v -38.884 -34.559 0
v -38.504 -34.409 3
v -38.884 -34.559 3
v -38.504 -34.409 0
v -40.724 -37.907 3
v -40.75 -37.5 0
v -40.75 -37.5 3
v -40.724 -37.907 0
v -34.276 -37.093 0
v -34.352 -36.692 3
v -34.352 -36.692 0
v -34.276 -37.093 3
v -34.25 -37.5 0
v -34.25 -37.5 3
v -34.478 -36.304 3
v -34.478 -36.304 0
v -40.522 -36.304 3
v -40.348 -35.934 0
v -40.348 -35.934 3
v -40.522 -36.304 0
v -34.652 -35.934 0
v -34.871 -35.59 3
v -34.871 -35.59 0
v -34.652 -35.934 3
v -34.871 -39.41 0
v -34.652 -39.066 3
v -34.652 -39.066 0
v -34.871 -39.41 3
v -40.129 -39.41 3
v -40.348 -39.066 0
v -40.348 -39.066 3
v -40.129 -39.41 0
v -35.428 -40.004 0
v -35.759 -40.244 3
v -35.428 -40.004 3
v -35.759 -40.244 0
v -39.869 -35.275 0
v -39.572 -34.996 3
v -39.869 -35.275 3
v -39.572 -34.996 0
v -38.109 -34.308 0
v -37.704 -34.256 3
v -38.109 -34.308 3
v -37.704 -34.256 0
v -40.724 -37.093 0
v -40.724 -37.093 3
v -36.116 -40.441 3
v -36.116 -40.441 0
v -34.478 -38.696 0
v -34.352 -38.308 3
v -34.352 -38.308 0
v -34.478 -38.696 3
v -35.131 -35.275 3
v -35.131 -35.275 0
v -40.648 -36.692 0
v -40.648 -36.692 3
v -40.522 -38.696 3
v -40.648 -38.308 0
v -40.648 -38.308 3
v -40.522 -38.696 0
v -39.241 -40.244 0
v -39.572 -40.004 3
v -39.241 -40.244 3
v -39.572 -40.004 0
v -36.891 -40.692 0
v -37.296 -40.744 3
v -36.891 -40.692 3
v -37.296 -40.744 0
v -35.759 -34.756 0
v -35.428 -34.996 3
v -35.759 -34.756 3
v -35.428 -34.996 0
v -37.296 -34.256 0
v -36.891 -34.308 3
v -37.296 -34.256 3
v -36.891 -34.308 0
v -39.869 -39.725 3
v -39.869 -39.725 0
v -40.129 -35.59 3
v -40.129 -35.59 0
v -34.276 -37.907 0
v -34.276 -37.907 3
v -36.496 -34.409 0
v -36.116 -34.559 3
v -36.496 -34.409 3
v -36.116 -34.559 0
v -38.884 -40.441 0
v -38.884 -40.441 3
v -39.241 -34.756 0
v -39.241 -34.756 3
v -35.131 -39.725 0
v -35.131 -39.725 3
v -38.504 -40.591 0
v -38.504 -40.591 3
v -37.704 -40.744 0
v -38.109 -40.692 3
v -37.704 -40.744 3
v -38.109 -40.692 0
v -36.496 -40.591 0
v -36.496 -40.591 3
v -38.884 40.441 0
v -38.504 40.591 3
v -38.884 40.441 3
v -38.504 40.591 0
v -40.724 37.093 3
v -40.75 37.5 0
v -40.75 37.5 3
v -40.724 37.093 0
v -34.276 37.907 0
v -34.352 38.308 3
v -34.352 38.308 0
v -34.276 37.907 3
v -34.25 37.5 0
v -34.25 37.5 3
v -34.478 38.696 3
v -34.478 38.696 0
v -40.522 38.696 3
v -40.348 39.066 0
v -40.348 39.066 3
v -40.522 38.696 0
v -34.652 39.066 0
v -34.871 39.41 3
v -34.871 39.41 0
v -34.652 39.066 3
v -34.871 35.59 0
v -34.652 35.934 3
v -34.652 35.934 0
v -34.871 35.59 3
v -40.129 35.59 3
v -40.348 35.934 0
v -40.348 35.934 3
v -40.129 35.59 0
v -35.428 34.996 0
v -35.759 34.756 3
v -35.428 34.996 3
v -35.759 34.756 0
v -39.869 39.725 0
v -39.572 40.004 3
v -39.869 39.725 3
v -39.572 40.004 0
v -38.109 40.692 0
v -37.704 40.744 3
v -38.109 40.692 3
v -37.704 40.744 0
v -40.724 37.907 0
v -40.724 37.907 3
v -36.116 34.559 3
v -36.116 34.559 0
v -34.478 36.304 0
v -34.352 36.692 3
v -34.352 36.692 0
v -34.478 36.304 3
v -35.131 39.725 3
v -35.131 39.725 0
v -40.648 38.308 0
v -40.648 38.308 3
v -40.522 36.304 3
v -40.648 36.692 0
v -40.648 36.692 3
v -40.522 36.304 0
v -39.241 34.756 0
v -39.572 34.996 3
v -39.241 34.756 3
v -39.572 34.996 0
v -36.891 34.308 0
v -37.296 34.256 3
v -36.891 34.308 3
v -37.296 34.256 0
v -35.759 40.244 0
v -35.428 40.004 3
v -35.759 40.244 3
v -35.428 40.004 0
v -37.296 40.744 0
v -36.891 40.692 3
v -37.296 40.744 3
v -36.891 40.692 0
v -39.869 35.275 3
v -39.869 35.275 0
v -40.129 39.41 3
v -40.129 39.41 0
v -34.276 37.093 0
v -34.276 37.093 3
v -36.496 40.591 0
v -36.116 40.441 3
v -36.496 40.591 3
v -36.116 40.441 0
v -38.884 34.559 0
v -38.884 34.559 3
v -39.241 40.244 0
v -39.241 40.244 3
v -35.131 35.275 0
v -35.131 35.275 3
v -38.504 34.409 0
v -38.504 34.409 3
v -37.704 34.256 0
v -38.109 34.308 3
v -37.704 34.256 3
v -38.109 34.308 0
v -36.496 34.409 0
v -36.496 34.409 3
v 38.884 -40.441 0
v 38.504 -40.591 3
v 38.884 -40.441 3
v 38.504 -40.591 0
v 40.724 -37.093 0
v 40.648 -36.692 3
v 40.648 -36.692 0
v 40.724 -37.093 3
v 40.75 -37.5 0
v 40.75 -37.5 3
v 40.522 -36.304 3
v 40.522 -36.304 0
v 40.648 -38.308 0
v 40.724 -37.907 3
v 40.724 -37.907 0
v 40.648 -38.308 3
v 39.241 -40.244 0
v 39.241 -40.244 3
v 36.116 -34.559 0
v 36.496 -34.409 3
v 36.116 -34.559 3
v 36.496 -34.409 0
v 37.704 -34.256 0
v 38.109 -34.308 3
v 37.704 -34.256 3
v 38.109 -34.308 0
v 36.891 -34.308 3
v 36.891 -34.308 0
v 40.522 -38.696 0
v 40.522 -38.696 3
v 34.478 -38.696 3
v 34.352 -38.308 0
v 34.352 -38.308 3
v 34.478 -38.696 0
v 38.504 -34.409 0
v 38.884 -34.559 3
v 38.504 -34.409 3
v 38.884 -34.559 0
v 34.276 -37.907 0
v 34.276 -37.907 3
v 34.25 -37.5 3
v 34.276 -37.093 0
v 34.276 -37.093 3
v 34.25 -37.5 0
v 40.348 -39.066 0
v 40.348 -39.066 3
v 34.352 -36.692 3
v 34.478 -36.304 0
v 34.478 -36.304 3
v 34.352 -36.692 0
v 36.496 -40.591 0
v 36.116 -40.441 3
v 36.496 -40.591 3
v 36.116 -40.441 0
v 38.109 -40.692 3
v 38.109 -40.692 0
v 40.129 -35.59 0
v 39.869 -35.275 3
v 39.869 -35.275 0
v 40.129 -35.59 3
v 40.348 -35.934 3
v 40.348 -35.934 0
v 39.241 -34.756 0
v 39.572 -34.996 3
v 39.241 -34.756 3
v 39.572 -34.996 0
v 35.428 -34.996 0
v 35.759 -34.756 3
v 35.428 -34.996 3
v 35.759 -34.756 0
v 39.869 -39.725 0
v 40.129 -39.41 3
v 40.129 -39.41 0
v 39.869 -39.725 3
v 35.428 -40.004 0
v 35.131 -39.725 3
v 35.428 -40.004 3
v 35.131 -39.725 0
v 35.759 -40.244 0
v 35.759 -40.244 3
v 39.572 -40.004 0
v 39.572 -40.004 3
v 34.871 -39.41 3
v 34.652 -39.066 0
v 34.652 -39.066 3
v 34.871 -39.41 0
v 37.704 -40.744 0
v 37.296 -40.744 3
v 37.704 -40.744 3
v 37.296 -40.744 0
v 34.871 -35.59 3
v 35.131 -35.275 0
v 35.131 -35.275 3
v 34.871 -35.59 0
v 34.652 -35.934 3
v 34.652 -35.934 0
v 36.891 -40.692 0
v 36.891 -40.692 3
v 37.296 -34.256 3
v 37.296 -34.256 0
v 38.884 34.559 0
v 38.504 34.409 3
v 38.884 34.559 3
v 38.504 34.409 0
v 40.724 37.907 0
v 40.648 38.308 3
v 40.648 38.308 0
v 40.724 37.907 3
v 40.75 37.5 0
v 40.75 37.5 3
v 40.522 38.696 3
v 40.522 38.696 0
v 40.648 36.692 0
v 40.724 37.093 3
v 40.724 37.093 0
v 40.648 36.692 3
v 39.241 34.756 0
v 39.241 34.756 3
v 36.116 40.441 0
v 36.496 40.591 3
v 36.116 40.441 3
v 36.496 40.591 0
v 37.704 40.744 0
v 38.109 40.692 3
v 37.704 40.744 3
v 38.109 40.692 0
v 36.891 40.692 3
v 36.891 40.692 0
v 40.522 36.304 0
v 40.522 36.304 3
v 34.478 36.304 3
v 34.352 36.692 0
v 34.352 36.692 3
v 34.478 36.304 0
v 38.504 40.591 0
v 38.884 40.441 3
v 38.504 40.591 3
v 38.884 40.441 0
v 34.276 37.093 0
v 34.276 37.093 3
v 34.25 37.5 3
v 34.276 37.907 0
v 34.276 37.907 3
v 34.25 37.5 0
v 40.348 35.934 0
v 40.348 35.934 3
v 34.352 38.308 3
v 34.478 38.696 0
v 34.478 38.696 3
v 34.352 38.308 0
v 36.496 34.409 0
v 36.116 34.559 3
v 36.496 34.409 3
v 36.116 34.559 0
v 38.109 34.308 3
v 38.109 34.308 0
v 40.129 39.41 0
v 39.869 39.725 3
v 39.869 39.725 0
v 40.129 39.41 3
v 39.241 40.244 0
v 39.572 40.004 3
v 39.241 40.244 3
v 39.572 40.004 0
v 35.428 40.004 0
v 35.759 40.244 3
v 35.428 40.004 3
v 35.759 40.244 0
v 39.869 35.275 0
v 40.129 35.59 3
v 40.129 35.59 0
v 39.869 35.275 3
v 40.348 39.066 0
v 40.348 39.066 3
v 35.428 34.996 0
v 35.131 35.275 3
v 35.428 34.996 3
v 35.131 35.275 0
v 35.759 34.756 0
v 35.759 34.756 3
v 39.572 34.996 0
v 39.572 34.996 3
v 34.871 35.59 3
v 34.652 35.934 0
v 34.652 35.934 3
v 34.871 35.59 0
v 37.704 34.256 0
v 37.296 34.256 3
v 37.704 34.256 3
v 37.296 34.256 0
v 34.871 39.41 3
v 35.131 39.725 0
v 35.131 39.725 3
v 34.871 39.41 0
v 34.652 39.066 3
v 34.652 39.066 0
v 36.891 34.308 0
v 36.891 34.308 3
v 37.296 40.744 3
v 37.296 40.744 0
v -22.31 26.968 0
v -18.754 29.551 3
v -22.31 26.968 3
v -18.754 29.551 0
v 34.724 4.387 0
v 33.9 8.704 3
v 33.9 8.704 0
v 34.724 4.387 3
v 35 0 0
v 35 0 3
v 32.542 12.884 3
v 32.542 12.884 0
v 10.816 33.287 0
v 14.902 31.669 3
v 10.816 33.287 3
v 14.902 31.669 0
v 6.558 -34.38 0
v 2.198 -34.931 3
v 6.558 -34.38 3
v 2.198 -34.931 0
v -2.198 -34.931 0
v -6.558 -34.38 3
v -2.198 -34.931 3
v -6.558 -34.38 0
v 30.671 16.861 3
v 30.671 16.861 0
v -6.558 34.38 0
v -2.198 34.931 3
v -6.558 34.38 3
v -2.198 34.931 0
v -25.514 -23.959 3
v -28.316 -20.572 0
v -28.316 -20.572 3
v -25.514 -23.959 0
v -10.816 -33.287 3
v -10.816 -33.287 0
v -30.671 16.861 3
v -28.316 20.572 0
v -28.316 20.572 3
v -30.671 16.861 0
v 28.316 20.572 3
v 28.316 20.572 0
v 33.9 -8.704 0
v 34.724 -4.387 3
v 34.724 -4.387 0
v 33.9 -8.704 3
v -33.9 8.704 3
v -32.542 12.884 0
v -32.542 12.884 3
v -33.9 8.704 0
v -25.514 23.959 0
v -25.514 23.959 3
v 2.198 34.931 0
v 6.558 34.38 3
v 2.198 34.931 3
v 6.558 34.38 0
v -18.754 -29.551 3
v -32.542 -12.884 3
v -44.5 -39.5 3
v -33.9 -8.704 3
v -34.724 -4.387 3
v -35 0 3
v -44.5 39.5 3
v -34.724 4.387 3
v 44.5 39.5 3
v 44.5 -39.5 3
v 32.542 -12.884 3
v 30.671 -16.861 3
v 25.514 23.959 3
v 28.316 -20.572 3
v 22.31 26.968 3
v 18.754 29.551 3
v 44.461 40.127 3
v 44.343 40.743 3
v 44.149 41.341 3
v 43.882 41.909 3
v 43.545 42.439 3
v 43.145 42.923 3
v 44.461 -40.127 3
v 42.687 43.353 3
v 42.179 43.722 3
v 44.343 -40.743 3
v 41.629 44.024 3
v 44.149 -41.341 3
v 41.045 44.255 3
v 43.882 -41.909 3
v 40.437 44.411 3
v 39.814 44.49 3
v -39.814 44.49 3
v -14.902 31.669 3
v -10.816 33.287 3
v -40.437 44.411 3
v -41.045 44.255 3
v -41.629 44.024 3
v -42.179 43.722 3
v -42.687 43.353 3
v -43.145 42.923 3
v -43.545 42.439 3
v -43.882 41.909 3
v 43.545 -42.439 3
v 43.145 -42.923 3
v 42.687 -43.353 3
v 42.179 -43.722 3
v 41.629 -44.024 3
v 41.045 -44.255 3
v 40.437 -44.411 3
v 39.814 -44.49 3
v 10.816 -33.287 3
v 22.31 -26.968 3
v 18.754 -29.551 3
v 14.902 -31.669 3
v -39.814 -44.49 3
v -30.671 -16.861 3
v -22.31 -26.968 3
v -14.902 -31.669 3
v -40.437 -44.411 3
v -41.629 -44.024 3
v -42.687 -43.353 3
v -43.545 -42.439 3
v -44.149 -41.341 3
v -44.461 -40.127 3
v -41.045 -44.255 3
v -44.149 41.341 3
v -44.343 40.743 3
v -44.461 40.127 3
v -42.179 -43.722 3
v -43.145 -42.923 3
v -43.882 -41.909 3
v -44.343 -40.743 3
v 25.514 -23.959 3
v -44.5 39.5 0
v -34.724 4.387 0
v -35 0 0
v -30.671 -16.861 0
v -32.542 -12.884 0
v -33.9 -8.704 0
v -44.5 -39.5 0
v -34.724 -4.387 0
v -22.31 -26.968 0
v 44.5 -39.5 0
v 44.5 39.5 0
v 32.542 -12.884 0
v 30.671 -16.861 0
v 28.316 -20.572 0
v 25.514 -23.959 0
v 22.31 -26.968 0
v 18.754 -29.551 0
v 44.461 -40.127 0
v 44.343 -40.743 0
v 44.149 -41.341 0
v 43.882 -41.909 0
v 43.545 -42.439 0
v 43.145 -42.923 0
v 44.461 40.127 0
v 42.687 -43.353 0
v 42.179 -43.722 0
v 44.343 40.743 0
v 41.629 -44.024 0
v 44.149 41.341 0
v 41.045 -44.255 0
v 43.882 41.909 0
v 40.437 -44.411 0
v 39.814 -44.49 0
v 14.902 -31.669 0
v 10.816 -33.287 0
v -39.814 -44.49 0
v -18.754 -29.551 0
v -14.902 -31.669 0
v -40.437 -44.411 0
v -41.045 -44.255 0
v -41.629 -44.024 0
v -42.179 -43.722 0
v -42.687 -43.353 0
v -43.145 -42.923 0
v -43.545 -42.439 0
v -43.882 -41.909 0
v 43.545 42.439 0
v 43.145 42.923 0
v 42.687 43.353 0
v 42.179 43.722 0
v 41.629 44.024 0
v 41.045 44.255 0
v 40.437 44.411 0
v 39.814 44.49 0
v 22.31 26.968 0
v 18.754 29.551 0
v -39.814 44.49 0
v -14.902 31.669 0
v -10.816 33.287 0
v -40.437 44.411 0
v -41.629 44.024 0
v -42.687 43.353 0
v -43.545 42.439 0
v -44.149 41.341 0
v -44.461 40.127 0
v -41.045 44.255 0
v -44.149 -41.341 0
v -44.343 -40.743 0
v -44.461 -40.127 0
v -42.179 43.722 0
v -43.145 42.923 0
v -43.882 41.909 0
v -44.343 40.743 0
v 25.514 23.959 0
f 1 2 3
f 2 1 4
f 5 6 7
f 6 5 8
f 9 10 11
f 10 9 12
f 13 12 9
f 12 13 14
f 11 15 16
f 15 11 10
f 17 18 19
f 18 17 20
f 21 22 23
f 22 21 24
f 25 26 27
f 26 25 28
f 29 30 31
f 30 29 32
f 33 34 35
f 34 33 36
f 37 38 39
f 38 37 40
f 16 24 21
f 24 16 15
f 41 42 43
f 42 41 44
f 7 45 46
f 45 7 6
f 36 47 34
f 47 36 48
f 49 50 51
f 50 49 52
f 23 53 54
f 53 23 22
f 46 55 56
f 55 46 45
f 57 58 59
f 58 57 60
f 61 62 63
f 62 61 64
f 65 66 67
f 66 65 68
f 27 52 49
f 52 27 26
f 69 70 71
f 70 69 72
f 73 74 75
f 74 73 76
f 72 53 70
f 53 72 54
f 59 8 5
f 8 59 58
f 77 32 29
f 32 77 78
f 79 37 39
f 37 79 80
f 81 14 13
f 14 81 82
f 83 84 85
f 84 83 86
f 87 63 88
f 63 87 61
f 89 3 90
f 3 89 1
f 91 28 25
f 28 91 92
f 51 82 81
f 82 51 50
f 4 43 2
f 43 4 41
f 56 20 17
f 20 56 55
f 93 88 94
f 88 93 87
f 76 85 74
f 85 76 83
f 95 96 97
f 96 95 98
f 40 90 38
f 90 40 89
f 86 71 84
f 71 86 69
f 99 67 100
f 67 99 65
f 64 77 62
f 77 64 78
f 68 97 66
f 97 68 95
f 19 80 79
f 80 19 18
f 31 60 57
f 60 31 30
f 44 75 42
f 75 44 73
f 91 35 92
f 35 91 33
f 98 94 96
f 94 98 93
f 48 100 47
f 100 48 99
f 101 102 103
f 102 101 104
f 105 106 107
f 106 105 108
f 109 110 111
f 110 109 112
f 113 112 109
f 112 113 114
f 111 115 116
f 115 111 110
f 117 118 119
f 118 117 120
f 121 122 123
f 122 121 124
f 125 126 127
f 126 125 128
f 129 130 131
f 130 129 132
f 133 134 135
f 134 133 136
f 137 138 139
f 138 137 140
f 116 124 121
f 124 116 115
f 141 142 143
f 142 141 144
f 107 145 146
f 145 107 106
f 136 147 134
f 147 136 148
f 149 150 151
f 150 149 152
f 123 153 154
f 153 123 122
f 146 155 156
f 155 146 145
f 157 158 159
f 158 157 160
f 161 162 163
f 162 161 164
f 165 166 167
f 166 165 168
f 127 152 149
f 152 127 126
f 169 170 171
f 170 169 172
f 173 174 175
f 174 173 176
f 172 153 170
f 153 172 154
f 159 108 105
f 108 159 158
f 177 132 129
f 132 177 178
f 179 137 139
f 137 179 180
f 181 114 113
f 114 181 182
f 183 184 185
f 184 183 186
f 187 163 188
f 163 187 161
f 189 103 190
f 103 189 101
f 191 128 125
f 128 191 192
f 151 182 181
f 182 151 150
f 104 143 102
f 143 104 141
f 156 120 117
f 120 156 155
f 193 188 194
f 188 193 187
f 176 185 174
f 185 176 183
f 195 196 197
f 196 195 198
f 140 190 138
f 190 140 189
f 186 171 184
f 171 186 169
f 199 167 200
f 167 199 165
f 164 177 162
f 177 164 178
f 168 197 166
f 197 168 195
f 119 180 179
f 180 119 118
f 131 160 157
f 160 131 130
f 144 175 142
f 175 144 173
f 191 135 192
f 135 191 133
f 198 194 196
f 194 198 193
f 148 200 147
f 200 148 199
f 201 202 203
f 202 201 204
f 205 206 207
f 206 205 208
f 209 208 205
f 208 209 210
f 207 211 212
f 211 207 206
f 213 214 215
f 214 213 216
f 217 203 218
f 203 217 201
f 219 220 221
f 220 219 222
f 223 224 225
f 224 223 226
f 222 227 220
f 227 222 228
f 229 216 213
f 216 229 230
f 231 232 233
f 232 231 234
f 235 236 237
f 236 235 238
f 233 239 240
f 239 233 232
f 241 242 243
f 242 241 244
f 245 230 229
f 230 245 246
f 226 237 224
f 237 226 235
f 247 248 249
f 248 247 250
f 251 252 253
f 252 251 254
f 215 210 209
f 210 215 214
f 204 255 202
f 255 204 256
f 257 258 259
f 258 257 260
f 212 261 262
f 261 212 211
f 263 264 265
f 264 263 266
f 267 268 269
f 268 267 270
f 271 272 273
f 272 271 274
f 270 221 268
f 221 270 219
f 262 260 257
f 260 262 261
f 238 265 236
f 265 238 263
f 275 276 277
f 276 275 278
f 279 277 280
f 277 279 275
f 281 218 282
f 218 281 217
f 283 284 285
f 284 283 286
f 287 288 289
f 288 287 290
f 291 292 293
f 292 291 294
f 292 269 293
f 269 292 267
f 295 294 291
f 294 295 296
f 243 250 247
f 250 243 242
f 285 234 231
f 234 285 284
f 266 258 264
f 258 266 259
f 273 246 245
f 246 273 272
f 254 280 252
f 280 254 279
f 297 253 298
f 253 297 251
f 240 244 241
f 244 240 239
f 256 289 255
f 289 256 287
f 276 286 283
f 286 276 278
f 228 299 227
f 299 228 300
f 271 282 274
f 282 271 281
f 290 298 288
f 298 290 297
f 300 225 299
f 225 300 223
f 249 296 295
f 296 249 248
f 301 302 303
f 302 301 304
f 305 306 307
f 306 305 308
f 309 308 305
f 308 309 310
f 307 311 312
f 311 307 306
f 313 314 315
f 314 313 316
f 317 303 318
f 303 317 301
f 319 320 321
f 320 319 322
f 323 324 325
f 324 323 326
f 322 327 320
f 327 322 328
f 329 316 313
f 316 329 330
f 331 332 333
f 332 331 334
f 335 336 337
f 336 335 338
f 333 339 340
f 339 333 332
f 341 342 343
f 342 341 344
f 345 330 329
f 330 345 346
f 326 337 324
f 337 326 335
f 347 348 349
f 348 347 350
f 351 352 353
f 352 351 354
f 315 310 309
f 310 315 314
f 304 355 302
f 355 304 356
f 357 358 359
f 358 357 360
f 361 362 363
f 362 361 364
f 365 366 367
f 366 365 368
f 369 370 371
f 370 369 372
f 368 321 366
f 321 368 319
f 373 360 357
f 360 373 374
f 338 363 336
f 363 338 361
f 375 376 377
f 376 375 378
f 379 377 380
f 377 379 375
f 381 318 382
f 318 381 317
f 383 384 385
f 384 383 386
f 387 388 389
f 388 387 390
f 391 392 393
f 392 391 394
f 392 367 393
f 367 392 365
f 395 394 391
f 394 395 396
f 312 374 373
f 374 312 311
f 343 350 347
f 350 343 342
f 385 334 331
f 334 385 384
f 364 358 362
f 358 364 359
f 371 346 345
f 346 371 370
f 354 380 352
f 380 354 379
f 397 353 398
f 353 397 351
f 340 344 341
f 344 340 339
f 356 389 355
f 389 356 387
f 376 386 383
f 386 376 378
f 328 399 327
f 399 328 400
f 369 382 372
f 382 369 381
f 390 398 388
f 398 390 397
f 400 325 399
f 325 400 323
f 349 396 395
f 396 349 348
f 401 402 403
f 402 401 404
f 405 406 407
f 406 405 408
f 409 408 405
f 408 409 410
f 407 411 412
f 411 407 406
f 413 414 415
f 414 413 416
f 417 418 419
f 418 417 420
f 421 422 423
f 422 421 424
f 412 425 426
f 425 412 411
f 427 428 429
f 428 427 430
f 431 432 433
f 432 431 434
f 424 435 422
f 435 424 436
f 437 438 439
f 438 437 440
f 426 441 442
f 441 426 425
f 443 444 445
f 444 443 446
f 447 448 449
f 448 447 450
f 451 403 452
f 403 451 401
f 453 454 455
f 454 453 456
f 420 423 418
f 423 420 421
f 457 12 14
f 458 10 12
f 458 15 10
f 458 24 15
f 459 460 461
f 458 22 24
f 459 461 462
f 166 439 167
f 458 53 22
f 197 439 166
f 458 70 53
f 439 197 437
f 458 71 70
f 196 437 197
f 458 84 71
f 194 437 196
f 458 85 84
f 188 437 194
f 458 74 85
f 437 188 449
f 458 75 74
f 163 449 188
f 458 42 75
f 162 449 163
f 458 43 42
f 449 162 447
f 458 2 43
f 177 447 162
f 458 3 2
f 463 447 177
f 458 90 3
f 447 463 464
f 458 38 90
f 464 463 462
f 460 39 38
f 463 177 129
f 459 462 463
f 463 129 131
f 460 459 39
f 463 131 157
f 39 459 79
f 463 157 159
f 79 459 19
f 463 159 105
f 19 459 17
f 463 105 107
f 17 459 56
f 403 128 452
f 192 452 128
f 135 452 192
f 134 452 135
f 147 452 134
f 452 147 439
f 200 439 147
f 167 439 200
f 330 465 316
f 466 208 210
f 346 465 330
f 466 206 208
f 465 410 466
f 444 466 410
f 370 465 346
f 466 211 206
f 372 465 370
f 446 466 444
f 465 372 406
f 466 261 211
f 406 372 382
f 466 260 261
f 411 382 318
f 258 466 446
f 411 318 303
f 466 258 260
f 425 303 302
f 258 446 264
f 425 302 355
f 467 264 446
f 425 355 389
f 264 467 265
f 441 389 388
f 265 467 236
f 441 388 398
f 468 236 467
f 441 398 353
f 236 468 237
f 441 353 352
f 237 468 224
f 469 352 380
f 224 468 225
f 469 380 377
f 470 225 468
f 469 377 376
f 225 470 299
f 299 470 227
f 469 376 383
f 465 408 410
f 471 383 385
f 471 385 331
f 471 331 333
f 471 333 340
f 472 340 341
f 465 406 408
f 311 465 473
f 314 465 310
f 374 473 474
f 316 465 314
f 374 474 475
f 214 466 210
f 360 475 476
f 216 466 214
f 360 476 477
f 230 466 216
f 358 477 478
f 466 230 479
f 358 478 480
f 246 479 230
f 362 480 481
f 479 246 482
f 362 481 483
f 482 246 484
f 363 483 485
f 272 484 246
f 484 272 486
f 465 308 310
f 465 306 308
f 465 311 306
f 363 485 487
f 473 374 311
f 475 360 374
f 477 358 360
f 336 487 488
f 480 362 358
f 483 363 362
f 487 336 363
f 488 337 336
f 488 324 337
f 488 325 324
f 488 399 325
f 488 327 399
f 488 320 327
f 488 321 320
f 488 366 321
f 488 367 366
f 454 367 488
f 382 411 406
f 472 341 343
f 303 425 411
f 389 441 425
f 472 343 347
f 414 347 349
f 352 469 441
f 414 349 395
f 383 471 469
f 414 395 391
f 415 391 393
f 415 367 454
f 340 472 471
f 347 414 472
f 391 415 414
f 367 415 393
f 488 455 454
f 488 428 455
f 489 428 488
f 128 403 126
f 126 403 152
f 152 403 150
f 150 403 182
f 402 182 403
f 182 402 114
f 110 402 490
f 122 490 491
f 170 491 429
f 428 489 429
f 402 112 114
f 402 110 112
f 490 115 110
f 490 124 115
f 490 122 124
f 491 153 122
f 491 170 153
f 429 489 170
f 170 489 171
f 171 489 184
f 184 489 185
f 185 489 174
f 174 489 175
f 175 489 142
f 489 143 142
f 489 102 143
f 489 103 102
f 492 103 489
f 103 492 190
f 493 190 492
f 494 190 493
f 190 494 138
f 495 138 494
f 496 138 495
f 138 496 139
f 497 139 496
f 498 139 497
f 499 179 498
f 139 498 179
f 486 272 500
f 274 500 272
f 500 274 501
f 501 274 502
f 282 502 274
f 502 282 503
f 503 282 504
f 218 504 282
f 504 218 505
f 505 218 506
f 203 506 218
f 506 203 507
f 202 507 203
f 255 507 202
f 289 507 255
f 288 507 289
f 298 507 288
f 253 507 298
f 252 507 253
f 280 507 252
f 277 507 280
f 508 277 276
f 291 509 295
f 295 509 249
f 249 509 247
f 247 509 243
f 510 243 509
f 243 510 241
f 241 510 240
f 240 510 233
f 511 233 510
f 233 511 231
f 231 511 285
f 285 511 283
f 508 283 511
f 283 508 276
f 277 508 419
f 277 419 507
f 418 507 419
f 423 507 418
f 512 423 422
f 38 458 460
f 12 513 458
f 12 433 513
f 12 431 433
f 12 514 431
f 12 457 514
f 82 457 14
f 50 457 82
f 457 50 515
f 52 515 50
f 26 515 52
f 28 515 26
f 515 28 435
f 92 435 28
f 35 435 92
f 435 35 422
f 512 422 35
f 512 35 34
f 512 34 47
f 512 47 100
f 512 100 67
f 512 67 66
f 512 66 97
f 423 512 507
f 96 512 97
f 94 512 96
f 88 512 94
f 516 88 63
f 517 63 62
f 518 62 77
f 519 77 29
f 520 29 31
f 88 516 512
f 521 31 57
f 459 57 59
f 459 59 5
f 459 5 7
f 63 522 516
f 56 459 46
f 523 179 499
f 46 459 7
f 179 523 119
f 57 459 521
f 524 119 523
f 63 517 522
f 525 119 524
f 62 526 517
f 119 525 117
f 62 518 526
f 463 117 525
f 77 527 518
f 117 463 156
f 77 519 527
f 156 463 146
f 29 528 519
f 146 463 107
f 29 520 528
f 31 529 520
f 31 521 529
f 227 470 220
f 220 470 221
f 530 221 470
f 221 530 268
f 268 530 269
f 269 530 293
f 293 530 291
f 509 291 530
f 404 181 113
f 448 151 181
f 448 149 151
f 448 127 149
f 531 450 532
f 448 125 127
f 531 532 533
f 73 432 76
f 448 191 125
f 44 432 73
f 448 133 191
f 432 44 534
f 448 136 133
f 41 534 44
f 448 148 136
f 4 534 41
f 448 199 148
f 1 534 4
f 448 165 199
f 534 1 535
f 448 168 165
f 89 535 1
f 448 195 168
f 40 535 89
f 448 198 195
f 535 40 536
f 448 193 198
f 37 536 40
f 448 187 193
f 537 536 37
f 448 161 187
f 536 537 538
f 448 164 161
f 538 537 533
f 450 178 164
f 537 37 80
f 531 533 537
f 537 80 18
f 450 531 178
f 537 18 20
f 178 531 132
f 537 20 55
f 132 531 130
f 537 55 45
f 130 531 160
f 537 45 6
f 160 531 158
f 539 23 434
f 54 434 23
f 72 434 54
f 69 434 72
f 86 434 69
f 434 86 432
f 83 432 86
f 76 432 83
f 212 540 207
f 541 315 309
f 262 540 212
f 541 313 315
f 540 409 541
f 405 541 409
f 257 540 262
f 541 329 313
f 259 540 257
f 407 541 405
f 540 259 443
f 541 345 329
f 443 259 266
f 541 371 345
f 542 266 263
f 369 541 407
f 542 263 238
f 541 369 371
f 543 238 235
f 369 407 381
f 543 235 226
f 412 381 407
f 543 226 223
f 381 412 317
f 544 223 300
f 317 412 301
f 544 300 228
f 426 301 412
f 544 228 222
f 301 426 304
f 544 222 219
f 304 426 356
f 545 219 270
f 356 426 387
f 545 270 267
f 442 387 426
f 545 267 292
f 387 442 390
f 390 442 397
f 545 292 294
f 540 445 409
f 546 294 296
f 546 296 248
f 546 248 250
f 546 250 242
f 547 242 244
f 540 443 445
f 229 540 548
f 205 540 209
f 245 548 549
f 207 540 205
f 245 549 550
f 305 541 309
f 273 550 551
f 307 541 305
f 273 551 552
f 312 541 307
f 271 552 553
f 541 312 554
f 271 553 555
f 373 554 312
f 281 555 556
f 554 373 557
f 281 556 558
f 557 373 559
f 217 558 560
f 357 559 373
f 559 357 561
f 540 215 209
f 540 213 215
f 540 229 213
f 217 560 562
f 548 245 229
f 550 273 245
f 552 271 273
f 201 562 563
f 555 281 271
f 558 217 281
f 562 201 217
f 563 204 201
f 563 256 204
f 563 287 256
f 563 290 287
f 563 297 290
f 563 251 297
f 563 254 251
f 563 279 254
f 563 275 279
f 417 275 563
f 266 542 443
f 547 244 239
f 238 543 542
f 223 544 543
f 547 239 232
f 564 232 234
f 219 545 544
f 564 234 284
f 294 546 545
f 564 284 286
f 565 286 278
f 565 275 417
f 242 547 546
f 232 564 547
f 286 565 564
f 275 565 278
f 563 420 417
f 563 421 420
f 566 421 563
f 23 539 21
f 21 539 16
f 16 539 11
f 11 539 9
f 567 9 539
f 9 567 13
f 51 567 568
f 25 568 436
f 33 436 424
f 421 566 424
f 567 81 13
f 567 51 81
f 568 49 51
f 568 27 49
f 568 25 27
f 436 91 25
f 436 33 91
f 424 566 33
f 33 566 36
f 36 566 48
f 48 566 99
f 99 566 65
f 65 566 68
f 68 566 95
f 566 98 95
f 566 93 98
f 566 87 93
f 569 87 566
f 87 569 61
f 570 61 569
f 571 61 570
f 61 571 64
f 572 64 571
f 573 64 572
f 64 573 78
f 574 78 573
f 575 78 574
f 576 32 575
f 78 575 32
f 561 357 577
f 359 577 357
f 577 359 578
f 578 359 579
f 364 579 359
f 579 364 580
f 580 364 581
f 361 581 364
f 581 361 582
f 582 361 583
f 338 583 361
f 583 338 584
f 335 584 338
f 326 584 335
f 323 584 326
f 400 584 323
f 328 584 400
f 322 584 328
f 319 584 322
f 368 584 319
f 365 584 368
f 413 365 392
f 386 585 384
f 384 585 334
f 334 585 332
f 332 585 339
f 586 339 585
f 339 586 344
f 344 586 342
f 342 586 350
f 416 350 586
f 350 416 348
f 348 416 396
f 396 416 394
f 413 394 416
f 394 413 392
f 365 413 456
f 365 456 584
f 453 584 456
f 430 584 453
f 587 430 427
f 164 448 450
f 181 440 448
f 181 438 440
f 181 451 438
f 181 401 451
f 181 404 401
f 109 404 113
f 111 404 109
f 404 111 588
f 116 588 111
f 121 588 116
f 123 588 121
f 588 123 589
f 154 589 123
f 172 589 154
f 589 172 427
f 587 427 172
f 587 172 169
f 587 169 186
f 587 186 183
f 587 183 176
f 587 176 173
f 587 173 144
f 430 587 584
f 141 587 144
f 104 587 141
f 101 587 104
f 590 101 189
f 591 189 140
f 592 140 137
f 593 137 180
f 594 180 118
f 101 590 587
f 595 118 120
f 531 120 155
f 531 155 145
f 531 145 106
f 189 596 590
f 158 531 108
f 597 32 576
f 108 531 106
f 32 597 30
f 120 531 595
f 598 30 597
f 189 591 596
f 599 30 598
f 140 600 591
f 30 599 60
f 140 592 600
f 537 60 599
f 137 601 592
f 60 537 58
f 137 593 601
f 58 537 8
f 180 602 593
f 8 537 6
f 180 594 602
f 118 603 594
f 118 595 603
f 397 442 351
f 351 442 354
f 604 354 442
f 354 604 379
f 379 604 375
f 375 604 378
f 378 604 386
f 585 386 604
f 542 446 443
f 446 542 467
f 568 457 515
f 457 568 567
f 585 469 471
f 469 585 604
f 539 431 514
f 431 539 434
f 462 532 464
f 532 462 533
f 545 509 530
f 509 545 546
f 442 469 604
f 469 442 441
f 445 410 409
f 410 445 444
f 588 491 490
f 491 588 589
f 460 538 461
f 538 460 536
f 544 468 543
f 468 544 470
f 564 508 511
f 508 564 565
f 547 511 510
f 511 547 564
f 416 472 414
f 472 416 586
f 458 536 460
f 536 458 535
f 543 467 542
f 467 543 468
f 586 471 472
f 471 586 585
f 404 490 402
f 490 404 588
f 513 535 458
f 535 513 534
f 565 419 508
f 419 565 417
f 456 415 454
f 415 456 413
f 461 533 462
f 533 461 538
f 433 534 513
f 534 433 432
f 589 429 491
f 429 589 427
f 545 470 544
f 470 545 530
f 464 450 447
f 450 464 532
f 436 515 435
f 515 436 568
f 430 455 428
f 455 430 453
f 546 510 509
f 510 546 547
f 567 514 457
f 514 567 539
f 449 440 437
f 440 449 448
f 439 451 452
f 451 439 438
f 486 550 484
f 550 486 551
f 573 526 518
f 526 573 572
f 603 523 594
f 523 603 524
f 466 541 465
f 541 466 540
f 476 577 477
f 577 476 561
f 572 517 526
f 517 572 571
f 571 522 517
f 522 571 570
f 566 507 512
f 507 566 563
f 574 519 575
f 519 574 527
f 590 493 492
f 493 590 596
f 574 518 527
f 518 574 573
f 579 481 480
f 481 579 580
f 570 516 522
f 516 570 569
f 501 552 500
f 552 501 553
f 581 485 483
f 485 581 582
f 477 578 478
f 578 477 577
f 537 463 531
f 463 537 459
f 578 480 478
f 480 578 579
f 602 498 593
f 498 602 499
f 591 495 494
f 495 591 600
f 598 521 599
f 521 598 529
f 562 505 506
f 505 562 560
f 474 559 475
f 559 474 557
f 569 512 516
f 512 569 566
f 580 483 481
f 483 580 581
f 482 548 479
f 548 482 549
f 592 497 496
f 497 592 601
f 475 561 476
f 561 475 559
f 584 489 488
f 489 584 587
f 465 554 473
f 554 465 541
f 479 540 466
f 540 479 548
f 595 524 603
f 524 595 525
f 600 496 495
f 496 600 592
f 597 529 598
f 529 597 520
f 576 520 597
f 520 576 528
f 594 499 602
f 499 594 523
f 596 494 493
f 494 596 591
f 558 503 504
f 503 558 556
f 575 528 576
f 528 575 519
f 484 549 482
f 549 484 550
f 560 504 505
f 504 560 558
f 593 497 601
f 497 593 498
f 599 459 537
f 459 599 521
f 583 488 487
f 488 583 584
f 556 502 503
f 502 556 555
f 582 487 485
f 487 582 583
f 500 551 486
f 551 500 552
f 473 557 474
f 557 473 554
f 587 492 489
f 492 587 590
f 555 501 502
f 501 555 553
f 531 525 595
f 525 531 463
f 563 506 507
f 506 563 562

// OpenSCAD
$fn = 50;


difference() {
	union() {
		hull() {
			translate(v = [-39.5000000000, 39.5000000000, 0]) {
				cylinder(h = 3, r = 5);
			}
			translate(v = [39.5000000000, 39.5000000000, 0]) {
				cylinder(h = 3, r = 5);
			}
			translate(v = [-39.5000000000, -39.5000000000, 0]) {
				cylinder(h = 3, r = 5);
			}
			translate(v = [39.5000000000, -39.5000000000, 0]) {
				cylinder(h = 3, r = 5);
			}
		}
	}
	union() {
		#translate(v = [-37.5000000000, -37.5000000000, -100.0000000000]) {
			cylinder(h = 200, r = 3.2500000000);
		}
		#translate(v = [-37.5000000000, 37.5000000000, -100.0000000000]) {
			cylinder(h = 200, r = 3.2500000000);
		}
		#translate(v = [37.5000000000, -37.5000000000, -100.0000000000]) {
			cylinder(h = 200, r = 3.2500000000);
		}
		#translate(v = [37.5000000000, 37.5000000000, -100.0000000000]) {
			cylinder(h = 200, r = 3.2500000000);
		}
		#cylinder(h = 3, r = 35.0000000000);
	}
}
